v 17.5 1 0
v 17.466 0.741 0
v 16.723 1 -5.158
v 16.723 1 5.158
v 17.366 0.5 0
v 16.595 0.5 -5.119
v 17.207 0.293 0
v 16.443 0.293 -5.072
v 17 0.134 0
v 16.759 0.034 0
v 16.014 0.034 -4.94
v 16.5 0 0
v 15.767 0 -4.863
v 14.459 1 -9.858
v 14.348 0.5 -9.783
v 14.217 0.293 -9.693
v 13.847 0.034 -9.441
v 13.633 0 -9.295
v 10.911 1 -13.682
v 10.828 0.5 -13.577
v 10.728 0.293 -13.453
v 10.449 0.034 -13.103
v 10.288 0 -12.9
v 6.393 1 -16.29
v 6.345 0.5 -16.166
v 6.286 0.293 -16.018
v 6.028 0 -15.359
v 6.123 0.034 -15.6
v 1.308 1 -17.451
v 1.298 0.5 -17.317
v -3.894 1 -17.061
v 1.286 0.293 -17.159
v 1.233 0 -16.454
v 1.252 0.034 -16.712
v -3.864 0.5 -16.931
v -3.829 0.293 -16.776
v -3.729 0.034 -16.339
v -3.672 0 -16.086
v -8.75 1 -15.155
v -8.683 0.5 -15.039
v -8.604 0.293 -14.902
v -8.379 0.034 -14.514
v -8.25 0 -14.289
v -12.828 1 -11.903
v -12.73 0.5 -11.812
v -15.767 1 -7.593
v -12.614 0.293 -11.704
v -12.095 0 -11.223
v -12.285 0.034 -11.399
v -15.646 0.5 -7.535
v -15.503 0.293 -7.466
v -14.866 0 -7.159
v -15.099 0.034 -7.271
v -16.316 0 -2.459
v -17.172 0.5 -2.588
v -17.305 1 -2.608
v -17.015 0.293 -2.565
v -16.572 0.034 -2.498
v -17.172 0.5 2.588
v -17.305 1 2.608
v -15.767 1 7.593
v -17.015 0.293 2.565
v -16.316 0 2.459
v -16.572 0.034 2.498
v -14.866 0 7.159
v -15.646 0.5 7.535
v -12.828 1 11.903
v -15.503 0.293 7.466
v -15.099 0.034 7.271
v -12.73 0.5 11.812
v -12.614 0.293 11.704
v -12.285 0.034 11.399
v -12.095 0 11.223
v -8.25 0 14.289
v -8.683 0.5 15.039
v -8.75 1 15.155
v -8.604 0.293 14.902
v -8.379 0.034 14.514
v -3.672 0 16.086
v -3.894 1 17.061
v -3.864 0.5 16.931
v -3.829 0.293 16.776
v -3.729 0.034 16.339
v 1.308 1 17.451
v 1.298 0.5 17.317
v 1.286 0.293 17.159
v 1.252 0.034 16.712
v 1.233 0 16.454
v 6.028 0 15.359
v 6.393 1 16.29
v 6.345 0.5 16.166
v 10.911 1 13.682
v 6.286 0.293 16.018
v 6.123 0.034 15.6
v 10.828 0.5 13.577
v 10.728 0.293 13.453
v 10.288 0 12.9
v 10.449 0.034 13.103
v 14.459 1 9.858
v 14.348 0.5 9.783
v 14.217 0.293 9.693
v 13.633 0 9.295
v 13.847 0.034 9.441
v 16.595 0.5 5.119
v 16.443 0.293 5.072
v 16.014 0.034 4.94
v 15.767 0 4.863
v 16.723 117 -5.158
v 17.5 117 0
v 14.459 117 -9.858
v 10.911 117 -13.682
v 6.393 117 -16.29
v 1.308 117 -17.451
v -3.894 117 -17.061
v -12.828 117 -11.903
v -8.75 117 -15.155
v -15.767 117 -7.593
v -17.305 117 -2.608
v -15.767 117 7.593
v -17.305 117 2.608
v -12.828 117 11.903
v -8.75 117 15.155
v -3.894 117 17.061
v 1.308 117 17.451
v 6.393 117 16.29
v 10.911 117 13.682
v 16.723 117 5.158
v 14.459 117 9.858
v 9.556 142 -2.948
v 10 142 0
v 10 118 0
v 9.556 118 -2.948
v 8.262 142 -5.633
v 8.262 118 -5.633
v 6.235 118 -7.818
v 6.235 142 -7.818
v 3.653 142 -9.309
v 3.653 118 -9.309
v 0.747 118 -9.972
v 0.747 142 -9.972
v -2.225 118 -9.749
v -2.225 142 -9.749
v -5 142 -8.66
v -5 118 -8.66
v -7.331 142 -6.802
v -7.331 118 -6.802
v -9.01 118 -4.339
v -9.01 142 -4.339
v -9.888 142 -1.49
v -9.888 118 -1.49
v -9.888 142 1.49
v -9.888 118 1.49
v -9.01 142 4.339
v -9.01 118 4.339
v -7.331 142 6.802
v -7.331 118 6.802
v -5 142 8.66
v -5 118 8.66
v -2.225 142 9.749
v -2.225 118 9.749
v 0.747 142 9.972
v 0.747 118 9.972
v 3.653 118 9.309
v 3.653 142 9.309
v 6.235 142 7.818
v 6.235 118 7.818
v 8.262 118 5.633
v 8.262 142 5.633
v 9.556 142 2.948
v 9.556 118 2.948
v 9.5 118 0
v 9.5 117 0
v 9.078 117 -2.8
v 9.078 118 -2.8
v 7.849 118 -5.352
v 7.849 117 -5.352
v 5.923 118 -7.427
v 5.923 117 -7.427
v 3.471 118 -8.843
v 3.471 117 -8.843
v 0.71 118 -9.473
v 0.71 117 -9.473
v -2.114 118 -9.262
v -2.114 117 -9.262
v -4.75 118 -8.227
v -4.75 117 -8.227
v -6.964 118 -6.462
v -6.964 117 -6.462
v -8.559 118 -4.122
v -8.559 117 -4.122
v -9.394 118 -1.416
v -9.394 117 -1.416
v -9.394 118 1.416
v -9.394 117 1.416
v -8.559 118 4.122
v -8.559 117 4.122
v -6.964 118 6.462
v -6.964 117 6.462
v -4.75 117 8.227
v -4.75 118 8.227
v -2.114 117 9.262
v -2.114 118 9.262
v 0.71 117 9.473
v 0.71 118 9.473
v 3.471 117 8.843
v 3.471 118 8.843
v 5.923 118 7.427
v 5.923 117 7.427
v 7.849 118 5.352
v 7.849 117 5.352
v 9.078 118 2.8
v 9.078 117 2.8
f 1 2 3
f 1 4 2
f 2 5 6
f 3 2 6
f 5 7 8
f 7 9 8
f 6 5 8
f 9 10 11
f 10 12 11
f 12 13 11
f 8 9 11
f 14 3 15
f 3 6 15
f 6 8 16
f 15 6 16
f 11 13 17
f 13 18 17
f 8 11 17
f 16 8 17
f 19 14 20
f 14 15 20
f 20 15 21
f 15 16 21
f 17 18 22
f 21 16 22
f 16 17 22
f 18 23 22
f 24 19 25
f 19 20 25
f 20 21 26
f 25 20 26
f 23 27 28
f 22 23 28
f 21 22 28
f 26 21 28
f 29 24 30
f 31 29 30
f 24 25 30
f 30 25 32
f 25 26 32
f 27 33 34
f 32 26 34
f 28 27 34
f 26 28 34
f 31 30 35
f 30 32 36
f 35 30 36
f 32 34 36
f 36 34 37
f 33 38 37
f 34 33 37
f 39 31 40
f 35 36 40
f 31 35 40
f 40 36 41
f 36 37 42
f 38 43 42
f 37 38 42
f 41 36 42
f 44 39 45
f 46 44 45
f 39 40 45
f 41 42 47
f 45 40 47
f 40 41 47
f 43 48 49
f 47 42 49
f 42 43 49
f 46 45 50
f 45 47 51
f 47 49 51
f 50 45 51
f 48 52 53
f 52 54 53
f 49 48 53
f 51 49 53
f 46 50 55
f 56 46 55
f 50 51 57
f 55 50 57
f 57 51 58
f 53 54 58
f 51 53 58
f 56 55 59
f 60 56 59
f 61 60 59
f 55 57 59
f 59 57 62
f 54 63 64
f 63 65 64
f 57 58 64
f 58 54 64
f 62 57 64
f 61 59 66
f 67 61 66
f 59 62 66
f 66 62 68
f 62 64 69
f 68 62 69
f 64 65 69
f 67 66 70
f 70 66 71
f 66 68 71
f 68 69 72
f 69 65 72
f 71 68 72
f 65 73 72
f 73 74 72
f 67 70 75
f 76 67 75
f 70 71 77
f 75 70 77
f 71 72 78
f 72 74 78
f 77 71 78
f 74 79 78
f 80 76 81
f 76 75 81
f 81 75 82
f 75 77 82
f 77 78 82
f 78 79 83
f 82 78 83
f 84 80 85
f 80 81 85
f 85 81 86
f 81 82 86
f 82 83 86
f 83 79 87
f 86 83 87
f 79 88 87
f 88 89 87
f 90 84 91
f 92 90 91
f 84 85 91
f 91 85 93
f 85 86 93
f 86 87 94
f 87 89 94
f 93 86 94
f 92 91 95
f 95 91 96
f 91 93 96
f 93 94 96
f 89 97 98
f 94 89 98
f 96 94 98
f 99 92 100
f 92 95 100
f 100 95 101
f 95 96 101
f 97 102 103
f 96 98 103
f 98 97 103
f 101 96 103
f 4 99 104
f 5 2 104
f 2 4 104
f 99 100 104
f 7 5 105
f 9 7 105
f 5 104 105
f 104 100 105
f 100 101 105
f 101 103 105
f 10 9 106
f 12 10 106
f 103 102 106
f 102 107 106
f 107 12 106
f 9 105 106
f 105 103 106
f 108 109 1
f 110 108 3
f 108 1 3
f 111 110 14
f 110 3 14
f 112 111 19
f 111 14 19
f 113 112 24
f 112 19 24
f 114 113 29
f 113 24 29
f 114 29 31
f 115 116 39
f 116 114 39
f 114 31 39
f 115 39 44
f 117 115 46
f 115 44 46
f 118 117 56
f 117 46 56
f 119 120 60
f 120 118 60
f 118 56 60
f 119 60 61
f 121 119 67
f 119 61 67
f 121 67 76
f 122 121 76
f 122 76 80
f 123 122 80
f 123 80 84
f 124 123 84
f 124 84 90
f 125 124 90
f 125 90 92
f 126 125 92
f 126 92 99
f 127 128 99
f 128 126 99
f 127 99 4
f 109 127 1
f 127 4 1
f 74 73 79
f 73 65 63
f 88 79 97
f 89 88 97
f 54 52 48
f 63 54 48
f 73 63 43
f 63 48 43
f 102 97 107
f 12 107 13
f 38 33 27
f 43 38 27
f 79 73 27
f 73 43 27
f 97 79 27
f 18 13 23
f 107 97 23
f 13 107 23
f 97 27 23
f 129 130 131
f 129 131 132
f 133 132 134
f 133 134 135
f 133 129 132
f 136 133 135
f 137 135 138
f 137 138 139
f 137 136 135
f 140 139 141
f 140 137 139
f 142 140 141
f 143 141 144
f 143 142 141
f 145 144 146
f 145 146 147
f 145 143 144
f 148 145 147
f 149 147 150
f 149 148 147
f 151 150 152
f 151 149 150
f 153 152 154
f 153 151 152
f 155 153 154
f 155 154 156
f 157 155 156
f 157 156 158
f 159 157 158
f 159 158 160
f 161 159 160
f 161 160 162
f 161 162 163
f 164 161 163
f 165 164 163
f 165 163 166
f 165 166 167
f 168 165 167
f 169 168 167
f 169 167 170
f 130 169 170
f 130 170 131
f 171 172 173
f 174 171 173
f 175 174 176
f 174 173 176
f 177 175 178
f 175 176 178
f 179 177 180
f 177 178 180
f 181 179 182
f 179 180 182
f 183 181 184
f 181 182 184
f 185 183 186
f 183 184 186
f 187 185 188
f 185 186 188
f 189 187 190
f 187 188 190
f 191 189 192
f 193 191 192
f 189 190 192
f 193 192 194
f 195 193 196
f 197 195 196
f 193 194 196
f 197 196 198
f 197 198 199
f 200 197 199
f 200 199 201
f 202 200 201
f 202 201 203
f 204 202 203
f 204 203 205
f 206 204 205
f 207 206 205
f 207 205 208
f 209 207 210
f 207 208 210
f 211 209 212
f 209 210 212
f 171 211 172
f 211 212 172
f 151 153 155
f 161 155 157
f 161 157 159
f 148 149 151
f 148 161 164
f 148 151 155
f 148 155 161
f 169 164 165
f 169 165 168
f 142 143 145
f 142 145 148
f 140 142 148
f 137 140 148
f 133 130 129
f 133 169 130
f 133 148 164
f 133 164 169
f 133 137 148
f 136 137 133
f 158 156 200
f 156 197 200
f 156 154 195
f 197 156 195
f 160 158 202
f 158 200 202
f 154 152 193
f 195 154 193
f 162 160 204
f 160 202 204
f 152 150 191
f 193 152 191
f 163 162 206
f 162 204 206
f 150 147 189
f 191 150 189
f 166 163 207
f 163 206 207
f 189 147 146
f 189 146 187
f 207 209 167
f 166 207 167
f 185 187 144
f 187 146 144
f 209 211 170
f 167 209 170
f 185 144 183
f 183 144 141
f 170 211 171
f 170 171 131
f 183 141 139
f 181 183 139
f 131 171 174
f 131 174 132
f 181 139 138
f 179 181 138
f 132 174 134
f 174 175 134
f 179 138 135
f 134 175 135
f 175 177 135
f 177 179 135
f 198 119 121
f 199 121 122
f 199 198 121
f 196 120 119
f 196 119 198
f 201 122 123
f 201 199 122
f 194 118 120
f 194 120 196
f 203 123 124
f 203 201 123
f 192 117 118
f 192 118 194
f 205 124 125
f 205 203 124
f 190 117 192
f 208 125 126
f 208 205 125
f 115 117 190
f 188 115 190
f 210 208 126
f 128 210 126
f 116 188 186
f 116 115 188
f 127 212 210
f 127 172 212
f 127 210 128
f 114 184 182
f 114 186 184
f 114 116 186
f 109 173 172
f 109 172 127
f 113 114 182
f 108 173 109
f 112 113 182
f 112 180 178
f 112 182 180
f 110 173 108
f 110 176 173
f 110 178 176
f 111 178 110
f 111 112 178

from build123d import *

# Parameters (mm, degrees)
SKETCH1_R           = 17.5
BOSS_EXTRUDE1_DEPTH = 142
SKETCH2_OUTSIDE_W   = 67.076
SKETCH2_OUTSIDE_H   = 67.076
SKETCH2_OUTSIDE_R   = 10
CUT_EXTRUDE1_DEPTH  = 25
SKETCH3_OUTSIDE_W   = 67.076
SKETCH3_OUTSIDE_H   = 67.076
SKETCH3_OUTSIDE_R   = 9.5
CUT_EXTRUDE2_DEPTH  = 1
FILLET1_R           = 1


with BuildPart() as part:
    # Sketch1 → Boss-Extrude1 (new body)
    with BuildSketch(Plane(origin=(0, 0, 0), x_dir=(1, 0, 0), z_dir=(0, 1, 0))):
        Circle(SKETCH1_R)
    extrude(amount=BOSS_EXTRUDE1_DEPTH)

    # Sketch2 outside → Cut-Extrude1 (cut)
    with BuildSketch(Plane(origin=(0, 142, 0), x_dir=(1, 0, 0), z_dir=(0, 1, 0))):
        Rectangle(SKETCH2_OUTSIDE_W, SKETCH2_OUTSIDE_H)
        Circle(SKETCH2_OUTSIDE_R, mode=Mode.SUBTRACT)
    extrude(amount=-CUT_EXTRUDE1_DEPTH, mode=Mode.SUBTRACT)

    # Sketch3 outside → Cut-Extrude2 (cut)
    with BuildSketch(Plane(origin=(0, 117, 0), x_dir=(1, 0, 0), z_dir=(0, 1, 0))):
        Rectangle(SKETCH3_OUTSIDE_W, SKETCH3_OUTSIDE_H)
        Circle(SKETCH3_OUTSIDE_R, mode=Mode.SUBTRACT)
    extrude(amount=CUT_EXTRUDE2_DEPTH, mode=Mode.SUBTRACT)

    # Fillet1
    fillet1_edges = [part.edges().sort_by_distance(p)[0] for p in [
        (-17.5, 0, 0),
    ]]
    fillet(fillet1_edges, radius=FILLET1_R)


solid = part.part
